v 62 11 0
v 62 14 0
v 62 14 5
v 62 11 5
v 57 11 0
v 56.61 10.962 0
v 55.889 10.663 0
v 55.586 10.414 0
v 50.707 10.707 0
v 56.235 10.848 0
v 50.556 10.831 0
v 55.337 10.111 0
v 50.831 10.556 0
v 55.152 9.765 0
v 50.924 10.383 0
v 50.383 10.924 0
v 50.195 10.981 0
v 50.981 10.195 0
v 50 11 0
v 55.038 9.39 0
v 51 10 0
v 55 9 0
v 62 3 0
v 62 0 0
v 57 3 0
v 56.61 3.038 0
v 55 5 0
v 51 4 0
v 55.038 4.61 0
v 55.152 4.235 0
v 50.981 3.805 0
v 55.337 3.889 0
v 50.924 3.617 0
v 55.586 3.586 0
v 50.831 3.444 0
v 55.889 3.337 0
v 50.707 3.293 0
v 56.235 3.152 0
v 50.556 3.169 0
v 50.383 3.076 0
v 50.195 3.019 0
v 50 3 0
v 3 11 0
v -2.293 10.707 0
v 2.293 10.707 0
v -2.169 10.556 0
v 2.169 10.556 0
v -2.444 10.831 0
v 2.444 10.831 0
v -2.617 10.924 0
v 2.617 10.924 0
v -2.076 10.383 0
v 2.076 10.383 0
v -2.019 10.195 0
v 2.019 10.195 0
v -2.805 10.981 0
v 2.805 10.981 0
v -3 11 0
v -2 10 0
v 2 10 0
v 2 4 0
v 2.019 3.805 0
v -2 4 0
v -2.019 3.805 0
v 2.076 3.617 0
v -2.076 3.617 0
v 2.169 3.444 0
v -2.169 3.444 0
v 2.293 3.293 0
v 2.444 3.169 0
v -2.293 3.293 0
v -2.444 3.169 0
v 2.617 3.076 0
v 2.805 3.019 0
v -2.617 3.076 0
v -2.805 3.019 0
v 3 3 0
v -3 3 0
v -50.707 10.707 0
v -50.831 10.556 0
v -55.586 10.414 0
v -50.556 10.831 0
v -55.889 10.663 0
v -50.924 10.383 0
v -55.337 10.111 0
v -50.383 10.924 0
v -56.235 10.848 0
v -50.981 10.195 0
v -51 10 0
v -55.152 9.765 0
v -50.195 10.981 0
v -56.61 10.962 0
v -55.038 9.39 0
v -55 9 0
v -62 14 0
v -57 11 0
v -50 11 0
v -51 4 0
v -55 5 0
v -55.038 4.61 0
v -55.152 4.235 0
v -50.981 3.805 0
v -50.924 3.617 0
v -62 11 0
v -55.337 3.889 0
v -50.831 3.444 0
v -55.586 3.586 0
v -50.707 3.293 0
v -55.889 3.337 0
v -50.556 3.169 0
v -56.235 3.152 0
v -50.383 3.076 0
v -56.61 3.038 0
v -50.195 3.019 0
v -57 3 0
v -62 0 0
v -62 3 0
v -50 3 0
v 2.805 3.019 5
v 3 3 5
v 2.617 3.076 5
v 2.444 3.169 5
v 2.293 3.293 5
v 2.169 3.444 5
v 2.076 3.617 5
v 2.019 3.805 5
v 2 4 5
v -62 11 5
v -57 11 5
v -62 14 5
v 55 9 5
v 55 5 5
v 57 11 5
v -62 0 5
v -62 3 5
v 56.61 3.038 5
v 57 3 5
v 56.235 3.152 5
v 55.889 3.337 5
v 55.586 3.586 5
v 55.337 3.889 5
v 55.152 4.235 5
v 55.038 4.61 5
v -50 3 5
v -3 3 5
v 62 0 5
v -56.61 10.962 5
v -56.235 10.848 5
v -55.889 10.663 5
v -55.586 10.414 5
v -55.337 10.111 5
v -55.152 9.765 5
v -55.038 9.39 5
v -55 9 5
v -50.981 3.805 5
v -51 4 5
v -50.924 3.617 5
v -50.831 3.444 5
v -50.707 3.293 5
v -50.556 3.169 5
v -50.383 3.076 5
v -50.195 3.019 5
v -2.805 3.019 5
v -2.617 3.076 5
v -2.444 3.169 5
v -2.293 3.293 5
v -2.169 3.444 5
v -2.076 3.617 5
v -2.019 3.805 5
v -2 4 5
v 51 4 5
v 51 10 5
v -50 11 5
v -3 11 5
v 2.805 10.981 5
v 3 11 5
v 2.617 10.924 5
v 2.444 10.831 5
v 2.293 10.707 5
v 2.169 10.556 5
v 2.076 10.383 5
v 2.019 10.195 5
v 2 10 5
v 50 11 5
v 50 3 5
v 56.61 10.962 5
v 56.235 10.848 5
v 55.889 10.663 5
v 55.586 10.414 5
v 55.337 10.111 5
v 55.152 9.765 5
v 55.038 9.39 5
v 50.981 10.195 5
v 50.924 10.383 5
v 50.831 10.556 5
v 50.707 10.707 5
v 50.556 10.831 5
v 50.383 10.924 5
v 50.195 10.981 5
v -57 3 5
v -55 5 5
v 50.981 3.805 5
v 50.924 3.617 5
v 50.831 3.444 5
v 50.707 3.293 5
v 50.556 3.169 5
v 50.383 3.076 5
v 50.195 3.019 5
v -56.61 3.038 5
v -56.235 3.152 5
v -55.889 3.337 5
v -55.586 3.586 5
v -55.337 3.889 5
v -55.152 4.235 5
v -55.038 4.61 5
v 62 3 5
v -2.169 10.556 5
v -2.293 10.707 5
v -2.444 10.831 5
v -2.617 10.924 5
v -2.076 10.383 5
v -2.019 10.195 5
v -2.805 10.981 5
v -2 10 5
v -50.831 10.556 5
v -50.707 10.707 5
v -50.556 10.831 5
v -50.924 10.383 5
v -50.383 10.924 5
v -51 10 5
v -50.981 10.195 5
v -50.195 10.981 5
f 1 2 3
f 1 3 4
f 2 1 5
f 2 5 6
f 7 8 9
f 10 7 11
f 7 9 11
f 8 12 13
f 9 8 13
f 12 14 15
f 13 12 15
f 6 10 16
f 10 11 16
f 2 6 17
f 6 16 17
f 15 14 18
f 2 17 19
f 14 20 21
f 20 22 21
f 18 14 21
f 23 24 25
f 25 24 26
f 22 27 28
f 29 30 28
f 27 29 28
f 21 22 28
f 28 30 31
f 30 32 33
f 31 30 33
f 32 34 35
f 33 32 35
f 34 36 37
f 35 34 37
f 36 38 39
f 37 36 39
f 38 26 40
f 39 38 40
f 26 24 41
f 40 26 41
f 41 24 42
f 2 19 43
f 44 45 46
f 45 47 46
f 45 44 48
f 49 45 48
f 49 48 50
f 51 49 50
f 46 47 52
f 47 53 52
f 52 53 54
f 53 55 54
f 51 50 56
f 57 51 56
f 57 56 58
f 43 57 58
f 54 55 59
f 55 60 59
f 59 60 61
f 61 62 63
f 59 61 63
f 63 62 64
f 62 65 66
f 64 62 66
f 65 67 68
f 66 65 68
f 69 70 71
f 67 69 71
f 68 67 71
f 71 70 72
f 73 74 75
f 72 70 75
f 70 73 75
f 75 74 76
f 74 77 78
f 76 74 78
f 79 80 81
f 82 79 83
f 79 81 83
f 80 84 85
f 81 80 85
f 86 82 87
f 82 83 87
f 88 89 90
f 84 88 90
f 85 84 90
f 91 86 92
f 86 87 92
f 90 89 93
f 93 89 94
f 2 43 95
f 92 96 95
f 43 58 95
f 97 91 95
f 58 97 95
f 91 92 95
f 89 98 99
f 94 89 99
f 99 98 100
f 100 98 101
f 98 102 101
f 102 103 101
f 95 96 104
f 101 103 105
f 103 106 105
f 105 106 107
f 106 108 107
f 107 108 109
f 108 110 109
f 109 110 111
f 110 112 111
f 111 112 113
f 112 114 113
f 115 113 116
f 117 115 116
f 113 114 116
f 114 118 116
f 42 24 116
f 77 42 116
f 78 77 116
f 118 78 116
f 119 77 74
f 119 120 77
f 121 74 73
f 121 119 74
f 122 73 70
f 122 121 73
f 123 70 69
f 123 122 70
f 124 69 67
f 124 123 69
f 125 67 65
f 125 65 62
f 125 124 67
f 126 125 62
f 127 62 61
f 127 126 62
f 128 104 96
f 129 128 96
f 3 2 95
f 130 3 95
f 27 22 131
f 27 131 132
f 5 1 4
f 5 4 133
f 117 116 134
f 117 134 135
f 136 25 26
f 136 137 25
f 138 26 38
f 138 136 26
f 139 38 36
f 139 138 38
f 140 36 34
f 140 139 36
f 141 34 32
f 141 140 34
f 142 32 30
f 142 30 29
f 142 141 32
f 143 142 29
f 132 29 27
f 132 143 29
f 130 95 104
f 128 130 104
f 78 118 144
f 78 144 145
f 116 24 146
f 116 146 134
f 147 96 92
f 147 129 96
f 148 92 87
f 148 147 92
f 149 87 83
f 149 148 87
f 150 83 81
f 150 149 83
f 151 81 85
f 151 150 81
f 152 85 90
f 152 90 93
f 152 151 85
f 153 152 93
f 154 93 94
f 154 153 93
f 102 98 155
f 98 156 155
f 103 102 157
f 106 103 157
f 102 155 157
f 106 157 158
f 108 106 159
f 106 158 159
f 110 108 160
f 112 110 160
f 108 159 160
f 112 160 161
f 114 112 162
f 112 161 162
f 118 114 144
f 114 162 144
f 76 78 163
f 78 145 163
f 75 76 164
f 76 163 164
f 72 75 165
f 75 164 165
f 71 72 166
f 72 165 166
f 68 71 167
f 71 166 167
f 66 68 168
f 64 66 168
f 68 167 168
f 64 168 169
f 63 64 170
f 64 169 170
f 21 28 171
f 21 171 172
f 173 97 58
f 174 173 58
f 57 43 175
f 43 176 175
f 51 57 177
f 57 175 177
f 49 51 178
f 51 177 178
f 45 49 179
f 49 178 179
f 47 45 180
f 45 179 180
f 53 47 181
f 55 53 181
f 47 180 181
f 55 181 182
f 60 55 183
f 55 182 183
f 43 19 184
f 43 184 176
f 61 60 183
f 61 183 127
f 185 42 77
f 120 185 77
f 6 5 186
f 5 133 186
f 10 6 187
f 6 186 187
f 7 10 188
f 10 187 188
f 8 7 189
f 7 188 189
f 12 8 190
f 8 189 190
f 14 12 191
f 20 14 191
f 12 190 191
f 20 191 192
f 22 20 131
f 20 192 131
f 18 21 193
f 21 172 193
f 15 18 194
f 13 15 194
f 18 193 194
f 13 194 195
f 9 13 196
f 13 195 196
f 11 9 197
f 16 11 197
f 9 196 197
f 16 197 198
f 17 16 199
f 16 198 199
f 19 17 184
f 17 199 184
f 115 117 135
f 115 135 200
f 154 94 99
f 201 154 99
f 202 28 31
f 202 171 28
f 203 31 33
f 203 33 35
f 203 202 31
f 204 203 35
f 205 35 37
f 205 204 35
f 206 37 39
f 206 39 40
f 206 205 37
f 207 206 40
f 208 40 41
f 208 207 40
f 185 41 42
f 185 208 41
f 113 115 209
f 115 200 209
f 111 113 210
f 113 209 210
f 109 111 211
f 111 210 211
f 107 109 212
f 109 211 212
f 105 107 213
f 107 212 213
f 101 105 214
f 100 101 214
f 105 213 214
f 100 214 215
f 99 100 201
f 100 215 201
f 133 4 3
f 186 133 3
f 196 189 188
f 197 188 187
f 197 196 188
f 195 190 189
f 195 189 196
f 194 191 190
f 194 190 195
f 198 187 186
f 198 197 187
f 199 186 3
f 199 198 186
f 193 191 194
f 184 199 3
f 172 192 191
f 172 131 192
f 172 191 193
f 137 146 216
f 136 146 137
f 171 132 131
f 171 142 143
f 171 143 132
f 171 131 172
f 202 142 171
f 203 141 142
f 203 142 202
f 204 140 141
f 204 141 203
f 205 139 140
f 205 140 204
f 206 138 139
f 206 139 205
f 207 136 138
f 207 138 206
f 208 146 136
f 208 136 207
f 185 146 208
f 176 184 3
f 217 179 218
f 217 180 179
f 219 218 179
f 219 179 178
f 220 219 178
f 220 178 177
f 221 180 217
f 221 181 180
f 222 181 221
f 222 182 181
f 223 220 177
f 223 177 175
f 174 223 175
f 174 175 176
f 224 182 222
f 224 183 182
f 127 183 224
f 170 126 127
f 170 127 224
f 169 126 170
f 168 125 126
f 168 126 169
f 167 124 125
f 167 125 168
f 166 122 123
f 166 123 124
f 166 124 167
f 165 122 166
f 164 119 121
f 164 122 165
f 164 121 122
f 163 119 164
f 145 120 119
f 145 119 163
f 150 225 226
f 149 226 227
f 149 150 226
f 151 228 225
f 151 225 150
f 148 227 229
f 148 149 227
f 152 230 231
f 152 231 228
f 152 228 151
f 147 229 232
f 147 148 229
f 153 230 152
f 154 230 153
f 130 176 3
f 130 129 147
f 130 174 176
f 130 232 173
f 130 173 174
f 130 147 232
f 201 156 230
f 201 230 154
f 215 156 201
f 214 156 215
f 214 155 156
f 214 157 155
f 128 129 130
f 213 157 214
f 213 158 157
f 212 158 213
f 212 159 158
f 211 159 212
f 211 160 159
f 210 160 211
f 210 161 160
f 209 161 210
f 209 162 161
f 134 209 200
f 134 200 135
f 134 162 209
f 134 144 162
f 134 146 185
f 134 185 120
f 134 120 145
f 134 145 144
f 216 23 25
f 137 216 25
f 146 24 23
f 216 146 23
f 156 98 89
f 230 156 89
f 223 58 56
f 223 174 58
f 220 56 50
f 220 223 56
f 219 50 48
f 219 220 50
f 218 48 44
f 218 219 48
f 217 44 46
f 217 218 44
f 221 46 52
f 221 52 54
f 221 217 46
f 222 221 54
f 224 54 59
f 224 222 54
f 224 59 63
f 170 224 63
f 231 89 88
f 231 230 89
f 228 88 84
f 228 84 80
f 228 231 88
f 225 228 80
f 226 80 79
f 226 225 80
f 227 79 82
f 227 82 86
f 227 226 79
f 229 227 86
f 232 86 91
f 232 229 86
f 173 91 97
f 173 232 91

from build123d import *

# Parameters (mm, degrees)
F1_DEPTH = 5
F2_R     = 2
F3_R     = 1


with BuildPart() as f1:
    # F0 (on Top) → F1 (new body)
    with BuildSketch(Plane.XY):
        Polygon((0, 3), (0, 0), (62, 0), (62, 3), (55, 3), (55, 7), (51, 7), (51, 3), (2, 3), (2, 7), (0, 7), align=None)
    extrude(amount=F1_DEPTH)

    # F2
    f2_edges = [f1.edges().sort_by_distance(p)[0] for p in [
        (55, 3, 2.5),
    ]]
    fillet(f2_edges, radius=F2_R)

    # F3
    f3_edges = [f1.edges().sort_by_distance(p)[0] for p in [
        (51, 3, 2.5),
        (2, 3, 2.5),
    ]]
    fillet(f3_edges, radius=F3_R)

    # F4: F1 across face


with BuildPart() as f1_1:
    add(f1.part)
    add(f1.part.mirror(Plane(origin=(0, 3.5, 2.5), x_dir=(0, -1, 0), z_dir=(-1, 0, 0))))

    # F5: F1 across face


with BuildPart() as f1_2:
    add(f1_1.part)
    add(f1_1.part.mirror(Plane(origin=(0, 7, 2.5), x_dir=(-1, 0, 0), z_dir=(0, 1, 0))))


solid = f1_2.part
